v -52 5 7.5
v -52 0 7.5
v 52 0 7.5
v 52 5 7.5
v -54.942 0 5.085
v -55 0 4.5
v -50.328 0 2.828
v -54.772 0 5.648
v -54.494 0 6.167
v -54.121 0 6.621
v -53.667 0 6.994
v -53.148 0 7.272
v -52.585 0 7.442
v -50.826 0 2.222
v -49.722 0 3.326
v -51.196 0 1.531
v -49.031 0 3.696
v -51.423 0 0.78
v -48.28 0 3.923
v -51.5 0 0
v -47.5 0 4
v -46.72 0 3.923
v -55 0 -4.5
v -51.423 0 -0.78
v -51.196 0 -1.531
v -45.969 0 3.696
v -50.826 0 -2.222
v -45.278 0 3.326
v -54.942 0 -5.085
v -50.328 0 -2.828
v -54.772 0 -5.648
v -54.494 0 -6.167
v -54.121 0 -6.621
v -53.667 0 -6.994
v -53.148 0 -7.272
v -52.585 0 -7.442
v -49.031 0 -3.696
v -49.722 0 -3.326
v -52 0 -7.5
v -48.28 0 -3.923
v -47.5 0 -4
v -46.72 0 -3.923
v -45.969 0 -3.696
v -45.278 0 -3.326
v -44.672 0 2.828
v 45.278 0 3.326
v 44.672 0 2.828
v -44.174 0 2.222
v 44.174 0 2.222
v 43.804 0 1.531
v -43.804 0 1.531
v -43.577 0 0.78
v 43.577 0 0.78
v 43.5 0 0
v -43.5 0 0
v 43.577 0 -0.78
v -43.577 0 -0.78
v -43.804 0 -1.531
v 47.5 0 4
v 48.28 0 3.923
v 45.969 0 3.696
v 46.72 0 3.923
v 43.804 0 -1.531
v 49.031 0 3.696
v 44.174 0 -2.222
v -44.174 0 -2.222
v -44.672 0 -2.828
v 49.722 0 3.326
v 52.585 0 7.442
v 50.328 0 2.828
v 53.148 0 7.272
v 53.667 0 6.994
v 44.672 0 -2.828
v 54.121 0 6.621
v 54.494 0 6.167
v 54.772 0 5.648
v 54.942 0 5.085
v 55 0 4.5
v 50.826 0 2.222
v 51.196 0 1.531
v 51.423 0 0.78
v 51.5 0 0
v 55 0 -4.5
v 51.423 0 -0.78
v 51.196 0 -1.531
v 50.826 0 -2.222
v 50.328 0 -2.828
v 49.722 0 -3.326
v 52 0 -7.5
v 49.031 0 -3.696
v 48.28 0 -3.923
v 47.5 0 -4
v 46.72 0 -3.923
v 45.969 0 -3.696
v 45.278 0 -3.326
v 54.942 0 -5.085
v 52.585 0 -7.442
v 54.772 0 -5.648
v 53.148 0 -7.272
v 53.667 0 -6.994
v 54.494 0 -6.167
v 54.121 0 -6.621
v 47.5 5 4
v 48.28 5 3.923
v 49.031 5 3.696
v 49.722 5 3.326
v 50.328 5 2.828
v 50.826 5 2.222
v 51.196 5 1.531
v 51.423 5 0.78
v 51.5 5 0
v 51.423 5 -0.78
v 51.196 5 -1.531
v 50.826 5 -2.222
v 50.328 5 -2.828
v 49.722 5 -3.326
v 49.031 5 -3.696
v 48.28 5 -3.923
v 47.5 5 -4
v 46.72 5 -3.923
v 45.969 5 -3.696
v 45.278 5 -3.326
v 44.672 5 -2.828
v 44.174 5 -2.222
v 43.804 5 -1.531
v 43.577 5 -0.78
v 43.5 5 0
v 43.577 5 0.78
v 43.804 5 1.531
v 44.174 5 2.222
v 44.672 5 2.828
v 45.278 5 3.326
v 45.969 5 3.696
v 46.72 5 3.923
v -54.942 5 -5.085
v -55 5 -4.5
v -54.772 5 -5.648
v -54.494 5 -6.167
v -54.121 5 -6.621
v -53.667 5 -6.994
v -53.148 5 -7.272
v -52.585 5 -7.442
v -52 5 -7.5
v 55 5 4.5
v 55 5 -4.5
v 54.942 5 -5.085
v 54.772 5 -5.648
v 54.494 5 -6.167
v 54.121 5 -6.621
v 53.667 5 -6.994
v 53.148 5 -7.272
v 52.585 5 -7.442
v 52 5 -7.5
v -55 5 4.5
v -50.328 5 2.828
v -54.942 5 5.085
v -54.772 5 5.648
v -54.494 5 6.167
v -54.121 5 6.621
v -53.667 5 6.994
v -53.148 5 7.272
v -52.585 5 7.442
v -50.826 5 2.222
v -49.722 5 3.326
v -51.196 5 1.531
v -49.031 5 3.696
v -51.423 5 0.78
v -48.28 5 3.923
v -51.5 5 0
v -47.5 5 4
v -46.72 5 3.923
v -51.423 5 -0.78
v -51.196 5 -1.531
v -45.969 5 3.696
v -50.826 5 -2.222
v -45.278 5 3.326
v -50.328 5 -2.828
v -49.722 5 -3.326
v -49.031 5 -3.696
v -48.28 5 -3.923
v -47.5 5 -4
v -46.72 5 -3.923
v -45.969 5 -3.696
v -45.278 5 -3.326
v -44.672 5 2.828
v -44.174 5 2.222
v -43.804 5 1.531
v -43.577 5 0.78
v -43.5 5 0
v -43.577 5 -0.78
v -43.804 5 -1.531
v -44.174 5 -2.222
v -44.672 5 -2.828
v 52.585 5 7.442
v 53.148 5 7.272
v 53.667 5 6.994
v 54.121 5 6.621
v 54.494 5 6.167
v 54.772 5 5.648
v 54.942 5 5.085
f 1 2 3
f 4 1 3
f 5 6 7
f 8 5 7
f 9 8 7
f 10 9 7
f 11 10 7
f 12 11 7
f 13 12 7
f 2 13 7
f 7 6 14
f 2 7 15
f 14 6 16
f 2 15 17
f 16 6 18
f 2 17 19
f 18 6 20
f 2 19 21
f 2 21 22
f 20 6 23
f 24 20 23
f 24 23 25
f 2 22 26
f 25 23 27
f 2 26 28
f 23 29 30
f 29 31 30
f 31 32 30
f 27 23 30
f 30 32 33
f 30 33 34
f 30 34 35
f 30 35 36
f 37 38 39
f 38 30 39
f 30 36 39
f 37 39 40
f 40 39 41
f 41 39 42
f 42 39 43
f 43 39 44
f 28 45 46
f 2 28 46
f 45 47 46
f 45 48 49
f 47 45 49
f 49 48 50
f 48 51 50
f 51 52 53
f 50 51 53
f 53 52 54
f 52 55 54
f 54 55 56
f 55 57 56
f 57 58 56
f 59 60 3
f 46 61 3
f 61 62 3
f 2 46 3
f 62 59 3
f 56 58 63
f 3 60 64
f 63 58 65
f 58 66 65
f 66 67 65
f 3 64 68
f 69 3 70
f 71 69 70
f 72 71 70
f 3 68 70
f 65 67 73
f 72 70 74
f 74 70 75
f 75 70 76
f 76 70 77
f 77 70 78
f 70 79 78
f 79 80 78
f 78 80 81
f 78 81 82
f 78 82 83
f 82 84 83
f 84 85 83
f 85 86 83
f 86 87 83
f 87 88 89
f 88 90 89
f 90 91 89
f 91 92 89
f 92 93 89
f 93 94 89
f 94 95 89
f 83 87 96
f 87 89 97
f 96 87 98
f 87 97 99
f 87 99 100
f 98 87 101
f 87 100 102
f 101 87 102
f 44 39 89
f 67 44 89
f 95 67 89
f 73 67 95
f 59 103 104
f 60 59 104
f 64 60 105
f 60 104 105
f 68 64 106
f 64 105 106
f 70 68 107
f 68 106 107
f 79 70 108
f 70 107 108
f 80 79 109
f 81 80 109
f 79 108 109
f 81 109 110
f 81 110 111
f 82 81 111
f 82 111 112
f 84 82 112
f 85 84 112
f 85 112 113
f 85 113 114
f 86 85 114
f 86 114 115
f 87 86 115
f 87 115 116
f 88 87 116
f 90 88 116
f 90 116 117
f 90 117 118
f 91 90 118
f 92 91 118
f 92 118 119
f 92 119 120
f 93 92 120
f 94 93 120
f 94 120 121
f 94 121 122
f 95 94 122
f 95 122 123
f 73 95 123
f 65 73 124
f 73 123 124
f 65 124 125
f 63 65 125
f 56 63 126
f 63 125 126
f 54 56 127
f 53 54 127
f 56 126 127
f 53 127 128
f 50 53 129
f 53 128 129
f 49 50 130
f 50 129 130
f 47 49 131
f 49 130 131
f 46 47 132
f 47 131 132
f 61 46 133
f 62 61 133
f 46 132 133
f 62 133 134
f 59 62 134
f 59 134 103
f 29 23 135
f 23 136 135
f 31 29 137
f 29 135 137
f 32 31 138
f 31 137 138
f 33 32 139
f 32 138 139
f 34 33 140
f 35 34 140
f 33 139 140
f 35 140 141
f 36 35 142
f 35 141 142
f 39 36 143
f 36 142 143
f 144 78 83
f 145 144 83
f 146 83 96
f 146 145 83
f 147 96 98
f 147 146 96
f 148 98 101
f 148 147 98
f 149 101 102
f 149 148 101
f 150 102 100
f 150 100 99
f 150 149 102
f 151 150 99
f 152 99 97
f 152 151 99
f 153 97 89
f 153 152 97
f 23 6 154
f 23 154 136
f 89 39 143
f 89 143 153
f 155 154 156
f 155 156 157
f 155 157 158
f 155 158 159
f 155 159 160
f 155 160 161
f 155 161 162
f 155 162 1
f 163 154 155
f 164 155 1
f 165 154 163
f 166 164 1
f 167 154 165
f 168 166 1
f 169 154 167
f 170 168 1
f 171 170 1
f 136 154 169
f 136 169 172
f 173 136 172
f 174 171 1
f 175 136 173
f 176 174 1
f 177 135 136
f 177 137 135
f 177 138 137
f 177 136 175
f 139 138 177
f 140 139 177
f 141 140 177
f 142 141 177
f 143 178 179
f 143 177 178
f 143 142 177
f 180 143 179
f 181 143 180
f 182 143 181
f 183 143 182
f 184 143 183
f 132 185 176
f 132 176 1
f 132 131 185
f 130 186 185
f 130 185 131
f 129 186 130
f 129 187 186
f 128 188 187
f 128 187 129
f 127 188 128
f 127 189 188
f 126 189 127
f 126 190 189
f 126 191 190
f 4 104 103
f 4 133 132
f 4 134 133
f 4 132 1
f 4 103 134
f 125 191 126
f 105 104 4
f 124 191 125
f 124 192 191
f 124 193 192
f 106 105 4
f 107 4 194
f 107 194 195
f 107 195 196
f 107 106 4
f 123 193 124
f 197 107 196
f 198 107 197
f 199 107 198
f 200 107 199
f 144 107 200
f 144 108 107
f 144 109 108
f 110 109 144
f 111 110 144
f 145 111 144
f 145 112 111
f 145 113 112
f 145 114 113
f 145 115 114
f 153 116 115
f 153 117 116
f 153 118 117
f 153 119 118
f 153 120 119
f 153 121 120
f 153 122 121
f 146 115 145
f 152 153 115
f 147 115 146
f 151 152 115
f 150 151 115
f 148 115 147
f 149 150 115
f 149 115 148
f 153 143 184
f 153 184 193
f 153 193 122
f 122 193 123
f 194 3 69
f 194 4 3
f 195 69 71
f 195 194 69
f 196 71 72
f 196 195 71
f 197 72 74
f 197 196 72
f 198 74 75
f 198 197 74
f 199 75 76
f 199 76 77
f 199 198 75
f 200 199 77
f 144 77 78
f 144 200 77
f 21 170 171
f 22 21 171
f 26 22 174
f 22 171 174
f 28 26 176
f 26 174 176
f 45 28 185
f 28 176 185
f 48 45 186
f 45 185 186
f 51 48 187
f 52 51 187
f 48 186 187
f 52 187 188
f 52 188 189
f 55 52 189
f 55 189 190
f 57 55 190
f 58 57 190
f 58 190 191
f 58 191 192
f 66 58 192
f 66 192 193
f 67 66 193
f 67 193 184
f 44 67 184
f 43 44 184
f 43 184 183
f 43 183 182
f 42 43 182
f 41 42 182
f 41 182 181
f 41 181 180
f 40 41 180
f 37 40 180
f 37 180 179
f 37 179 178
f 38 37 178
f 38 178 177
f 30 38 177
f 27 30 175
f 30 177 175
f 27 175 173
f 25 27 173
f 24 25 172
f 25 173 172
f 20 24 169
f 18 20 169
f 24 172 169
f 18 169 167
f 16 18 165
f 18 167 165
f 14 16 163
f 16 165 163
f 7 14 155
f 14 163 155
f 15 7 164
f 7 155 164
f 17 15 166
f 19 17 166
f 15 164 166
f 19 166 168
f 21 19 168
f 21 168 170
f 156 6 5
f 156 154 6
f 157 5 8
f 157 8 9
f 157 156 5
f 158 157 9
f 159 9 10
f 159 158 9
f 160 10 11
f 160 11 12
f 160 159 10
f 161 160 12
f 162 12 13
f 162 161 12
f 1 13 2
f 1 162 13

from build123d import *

# Parameters (mm, degrees)
CROQUIS1_W              = 110
CROQUIS1_H              = 15
SALIENTE_EXTRUIR1_DEPTH = 5
REDONDEO1_R             = 3
CROQUIS2_R              = 4
CORTAR_EXTRUIR1_DEPTH   = 56.733742024


with BuildPart() as part:
    # Croquis1 → Saliente-Extruir1 (new body)
    with BuildSketch(Plane(origin=(0, 0, 0), x_dir=(1, 0, 0), z_dir=(0, 1, 0))):
        Rectangle(CROQUIS1_W, CROQUIS1_H)
    extrude(amount=SALIENTE_EXTRUIR1_DEPTH)

    # Redondeo1
    redondeo1_edges = [part.edges().sort_by_distance(p)[0] for p in [
        (55, 2.5, 7.5),
        (-55, 2.5, 7.5),
        (-55, 2.5, -7.5),
        (55, 2.5, -7.5),
    ]]
    fillet(redondeo1_edges, radius=REDONDEO1_R)

    # Croquis2 → Cortar-Extruir1 (cut, through all)
    with BuildSketch(Plane(origin=(0, 5, 0), x_dir=(1, 0, 0), z_dir=(0, 1, 0))):
        with Locations(Location((-47.5, 0, 0), (0, 0, 270))):
            Circle(CROQUIS2_R)
        with Locations(Location((47.5, 0, 0), (0, 0, 270))):
            Circle(CROQUIS2_R)
    extrude(amount=-CORTAR_EXTRUIR1_DEPTH, mode=Mode.SUBTRACT)


solid = part.part
